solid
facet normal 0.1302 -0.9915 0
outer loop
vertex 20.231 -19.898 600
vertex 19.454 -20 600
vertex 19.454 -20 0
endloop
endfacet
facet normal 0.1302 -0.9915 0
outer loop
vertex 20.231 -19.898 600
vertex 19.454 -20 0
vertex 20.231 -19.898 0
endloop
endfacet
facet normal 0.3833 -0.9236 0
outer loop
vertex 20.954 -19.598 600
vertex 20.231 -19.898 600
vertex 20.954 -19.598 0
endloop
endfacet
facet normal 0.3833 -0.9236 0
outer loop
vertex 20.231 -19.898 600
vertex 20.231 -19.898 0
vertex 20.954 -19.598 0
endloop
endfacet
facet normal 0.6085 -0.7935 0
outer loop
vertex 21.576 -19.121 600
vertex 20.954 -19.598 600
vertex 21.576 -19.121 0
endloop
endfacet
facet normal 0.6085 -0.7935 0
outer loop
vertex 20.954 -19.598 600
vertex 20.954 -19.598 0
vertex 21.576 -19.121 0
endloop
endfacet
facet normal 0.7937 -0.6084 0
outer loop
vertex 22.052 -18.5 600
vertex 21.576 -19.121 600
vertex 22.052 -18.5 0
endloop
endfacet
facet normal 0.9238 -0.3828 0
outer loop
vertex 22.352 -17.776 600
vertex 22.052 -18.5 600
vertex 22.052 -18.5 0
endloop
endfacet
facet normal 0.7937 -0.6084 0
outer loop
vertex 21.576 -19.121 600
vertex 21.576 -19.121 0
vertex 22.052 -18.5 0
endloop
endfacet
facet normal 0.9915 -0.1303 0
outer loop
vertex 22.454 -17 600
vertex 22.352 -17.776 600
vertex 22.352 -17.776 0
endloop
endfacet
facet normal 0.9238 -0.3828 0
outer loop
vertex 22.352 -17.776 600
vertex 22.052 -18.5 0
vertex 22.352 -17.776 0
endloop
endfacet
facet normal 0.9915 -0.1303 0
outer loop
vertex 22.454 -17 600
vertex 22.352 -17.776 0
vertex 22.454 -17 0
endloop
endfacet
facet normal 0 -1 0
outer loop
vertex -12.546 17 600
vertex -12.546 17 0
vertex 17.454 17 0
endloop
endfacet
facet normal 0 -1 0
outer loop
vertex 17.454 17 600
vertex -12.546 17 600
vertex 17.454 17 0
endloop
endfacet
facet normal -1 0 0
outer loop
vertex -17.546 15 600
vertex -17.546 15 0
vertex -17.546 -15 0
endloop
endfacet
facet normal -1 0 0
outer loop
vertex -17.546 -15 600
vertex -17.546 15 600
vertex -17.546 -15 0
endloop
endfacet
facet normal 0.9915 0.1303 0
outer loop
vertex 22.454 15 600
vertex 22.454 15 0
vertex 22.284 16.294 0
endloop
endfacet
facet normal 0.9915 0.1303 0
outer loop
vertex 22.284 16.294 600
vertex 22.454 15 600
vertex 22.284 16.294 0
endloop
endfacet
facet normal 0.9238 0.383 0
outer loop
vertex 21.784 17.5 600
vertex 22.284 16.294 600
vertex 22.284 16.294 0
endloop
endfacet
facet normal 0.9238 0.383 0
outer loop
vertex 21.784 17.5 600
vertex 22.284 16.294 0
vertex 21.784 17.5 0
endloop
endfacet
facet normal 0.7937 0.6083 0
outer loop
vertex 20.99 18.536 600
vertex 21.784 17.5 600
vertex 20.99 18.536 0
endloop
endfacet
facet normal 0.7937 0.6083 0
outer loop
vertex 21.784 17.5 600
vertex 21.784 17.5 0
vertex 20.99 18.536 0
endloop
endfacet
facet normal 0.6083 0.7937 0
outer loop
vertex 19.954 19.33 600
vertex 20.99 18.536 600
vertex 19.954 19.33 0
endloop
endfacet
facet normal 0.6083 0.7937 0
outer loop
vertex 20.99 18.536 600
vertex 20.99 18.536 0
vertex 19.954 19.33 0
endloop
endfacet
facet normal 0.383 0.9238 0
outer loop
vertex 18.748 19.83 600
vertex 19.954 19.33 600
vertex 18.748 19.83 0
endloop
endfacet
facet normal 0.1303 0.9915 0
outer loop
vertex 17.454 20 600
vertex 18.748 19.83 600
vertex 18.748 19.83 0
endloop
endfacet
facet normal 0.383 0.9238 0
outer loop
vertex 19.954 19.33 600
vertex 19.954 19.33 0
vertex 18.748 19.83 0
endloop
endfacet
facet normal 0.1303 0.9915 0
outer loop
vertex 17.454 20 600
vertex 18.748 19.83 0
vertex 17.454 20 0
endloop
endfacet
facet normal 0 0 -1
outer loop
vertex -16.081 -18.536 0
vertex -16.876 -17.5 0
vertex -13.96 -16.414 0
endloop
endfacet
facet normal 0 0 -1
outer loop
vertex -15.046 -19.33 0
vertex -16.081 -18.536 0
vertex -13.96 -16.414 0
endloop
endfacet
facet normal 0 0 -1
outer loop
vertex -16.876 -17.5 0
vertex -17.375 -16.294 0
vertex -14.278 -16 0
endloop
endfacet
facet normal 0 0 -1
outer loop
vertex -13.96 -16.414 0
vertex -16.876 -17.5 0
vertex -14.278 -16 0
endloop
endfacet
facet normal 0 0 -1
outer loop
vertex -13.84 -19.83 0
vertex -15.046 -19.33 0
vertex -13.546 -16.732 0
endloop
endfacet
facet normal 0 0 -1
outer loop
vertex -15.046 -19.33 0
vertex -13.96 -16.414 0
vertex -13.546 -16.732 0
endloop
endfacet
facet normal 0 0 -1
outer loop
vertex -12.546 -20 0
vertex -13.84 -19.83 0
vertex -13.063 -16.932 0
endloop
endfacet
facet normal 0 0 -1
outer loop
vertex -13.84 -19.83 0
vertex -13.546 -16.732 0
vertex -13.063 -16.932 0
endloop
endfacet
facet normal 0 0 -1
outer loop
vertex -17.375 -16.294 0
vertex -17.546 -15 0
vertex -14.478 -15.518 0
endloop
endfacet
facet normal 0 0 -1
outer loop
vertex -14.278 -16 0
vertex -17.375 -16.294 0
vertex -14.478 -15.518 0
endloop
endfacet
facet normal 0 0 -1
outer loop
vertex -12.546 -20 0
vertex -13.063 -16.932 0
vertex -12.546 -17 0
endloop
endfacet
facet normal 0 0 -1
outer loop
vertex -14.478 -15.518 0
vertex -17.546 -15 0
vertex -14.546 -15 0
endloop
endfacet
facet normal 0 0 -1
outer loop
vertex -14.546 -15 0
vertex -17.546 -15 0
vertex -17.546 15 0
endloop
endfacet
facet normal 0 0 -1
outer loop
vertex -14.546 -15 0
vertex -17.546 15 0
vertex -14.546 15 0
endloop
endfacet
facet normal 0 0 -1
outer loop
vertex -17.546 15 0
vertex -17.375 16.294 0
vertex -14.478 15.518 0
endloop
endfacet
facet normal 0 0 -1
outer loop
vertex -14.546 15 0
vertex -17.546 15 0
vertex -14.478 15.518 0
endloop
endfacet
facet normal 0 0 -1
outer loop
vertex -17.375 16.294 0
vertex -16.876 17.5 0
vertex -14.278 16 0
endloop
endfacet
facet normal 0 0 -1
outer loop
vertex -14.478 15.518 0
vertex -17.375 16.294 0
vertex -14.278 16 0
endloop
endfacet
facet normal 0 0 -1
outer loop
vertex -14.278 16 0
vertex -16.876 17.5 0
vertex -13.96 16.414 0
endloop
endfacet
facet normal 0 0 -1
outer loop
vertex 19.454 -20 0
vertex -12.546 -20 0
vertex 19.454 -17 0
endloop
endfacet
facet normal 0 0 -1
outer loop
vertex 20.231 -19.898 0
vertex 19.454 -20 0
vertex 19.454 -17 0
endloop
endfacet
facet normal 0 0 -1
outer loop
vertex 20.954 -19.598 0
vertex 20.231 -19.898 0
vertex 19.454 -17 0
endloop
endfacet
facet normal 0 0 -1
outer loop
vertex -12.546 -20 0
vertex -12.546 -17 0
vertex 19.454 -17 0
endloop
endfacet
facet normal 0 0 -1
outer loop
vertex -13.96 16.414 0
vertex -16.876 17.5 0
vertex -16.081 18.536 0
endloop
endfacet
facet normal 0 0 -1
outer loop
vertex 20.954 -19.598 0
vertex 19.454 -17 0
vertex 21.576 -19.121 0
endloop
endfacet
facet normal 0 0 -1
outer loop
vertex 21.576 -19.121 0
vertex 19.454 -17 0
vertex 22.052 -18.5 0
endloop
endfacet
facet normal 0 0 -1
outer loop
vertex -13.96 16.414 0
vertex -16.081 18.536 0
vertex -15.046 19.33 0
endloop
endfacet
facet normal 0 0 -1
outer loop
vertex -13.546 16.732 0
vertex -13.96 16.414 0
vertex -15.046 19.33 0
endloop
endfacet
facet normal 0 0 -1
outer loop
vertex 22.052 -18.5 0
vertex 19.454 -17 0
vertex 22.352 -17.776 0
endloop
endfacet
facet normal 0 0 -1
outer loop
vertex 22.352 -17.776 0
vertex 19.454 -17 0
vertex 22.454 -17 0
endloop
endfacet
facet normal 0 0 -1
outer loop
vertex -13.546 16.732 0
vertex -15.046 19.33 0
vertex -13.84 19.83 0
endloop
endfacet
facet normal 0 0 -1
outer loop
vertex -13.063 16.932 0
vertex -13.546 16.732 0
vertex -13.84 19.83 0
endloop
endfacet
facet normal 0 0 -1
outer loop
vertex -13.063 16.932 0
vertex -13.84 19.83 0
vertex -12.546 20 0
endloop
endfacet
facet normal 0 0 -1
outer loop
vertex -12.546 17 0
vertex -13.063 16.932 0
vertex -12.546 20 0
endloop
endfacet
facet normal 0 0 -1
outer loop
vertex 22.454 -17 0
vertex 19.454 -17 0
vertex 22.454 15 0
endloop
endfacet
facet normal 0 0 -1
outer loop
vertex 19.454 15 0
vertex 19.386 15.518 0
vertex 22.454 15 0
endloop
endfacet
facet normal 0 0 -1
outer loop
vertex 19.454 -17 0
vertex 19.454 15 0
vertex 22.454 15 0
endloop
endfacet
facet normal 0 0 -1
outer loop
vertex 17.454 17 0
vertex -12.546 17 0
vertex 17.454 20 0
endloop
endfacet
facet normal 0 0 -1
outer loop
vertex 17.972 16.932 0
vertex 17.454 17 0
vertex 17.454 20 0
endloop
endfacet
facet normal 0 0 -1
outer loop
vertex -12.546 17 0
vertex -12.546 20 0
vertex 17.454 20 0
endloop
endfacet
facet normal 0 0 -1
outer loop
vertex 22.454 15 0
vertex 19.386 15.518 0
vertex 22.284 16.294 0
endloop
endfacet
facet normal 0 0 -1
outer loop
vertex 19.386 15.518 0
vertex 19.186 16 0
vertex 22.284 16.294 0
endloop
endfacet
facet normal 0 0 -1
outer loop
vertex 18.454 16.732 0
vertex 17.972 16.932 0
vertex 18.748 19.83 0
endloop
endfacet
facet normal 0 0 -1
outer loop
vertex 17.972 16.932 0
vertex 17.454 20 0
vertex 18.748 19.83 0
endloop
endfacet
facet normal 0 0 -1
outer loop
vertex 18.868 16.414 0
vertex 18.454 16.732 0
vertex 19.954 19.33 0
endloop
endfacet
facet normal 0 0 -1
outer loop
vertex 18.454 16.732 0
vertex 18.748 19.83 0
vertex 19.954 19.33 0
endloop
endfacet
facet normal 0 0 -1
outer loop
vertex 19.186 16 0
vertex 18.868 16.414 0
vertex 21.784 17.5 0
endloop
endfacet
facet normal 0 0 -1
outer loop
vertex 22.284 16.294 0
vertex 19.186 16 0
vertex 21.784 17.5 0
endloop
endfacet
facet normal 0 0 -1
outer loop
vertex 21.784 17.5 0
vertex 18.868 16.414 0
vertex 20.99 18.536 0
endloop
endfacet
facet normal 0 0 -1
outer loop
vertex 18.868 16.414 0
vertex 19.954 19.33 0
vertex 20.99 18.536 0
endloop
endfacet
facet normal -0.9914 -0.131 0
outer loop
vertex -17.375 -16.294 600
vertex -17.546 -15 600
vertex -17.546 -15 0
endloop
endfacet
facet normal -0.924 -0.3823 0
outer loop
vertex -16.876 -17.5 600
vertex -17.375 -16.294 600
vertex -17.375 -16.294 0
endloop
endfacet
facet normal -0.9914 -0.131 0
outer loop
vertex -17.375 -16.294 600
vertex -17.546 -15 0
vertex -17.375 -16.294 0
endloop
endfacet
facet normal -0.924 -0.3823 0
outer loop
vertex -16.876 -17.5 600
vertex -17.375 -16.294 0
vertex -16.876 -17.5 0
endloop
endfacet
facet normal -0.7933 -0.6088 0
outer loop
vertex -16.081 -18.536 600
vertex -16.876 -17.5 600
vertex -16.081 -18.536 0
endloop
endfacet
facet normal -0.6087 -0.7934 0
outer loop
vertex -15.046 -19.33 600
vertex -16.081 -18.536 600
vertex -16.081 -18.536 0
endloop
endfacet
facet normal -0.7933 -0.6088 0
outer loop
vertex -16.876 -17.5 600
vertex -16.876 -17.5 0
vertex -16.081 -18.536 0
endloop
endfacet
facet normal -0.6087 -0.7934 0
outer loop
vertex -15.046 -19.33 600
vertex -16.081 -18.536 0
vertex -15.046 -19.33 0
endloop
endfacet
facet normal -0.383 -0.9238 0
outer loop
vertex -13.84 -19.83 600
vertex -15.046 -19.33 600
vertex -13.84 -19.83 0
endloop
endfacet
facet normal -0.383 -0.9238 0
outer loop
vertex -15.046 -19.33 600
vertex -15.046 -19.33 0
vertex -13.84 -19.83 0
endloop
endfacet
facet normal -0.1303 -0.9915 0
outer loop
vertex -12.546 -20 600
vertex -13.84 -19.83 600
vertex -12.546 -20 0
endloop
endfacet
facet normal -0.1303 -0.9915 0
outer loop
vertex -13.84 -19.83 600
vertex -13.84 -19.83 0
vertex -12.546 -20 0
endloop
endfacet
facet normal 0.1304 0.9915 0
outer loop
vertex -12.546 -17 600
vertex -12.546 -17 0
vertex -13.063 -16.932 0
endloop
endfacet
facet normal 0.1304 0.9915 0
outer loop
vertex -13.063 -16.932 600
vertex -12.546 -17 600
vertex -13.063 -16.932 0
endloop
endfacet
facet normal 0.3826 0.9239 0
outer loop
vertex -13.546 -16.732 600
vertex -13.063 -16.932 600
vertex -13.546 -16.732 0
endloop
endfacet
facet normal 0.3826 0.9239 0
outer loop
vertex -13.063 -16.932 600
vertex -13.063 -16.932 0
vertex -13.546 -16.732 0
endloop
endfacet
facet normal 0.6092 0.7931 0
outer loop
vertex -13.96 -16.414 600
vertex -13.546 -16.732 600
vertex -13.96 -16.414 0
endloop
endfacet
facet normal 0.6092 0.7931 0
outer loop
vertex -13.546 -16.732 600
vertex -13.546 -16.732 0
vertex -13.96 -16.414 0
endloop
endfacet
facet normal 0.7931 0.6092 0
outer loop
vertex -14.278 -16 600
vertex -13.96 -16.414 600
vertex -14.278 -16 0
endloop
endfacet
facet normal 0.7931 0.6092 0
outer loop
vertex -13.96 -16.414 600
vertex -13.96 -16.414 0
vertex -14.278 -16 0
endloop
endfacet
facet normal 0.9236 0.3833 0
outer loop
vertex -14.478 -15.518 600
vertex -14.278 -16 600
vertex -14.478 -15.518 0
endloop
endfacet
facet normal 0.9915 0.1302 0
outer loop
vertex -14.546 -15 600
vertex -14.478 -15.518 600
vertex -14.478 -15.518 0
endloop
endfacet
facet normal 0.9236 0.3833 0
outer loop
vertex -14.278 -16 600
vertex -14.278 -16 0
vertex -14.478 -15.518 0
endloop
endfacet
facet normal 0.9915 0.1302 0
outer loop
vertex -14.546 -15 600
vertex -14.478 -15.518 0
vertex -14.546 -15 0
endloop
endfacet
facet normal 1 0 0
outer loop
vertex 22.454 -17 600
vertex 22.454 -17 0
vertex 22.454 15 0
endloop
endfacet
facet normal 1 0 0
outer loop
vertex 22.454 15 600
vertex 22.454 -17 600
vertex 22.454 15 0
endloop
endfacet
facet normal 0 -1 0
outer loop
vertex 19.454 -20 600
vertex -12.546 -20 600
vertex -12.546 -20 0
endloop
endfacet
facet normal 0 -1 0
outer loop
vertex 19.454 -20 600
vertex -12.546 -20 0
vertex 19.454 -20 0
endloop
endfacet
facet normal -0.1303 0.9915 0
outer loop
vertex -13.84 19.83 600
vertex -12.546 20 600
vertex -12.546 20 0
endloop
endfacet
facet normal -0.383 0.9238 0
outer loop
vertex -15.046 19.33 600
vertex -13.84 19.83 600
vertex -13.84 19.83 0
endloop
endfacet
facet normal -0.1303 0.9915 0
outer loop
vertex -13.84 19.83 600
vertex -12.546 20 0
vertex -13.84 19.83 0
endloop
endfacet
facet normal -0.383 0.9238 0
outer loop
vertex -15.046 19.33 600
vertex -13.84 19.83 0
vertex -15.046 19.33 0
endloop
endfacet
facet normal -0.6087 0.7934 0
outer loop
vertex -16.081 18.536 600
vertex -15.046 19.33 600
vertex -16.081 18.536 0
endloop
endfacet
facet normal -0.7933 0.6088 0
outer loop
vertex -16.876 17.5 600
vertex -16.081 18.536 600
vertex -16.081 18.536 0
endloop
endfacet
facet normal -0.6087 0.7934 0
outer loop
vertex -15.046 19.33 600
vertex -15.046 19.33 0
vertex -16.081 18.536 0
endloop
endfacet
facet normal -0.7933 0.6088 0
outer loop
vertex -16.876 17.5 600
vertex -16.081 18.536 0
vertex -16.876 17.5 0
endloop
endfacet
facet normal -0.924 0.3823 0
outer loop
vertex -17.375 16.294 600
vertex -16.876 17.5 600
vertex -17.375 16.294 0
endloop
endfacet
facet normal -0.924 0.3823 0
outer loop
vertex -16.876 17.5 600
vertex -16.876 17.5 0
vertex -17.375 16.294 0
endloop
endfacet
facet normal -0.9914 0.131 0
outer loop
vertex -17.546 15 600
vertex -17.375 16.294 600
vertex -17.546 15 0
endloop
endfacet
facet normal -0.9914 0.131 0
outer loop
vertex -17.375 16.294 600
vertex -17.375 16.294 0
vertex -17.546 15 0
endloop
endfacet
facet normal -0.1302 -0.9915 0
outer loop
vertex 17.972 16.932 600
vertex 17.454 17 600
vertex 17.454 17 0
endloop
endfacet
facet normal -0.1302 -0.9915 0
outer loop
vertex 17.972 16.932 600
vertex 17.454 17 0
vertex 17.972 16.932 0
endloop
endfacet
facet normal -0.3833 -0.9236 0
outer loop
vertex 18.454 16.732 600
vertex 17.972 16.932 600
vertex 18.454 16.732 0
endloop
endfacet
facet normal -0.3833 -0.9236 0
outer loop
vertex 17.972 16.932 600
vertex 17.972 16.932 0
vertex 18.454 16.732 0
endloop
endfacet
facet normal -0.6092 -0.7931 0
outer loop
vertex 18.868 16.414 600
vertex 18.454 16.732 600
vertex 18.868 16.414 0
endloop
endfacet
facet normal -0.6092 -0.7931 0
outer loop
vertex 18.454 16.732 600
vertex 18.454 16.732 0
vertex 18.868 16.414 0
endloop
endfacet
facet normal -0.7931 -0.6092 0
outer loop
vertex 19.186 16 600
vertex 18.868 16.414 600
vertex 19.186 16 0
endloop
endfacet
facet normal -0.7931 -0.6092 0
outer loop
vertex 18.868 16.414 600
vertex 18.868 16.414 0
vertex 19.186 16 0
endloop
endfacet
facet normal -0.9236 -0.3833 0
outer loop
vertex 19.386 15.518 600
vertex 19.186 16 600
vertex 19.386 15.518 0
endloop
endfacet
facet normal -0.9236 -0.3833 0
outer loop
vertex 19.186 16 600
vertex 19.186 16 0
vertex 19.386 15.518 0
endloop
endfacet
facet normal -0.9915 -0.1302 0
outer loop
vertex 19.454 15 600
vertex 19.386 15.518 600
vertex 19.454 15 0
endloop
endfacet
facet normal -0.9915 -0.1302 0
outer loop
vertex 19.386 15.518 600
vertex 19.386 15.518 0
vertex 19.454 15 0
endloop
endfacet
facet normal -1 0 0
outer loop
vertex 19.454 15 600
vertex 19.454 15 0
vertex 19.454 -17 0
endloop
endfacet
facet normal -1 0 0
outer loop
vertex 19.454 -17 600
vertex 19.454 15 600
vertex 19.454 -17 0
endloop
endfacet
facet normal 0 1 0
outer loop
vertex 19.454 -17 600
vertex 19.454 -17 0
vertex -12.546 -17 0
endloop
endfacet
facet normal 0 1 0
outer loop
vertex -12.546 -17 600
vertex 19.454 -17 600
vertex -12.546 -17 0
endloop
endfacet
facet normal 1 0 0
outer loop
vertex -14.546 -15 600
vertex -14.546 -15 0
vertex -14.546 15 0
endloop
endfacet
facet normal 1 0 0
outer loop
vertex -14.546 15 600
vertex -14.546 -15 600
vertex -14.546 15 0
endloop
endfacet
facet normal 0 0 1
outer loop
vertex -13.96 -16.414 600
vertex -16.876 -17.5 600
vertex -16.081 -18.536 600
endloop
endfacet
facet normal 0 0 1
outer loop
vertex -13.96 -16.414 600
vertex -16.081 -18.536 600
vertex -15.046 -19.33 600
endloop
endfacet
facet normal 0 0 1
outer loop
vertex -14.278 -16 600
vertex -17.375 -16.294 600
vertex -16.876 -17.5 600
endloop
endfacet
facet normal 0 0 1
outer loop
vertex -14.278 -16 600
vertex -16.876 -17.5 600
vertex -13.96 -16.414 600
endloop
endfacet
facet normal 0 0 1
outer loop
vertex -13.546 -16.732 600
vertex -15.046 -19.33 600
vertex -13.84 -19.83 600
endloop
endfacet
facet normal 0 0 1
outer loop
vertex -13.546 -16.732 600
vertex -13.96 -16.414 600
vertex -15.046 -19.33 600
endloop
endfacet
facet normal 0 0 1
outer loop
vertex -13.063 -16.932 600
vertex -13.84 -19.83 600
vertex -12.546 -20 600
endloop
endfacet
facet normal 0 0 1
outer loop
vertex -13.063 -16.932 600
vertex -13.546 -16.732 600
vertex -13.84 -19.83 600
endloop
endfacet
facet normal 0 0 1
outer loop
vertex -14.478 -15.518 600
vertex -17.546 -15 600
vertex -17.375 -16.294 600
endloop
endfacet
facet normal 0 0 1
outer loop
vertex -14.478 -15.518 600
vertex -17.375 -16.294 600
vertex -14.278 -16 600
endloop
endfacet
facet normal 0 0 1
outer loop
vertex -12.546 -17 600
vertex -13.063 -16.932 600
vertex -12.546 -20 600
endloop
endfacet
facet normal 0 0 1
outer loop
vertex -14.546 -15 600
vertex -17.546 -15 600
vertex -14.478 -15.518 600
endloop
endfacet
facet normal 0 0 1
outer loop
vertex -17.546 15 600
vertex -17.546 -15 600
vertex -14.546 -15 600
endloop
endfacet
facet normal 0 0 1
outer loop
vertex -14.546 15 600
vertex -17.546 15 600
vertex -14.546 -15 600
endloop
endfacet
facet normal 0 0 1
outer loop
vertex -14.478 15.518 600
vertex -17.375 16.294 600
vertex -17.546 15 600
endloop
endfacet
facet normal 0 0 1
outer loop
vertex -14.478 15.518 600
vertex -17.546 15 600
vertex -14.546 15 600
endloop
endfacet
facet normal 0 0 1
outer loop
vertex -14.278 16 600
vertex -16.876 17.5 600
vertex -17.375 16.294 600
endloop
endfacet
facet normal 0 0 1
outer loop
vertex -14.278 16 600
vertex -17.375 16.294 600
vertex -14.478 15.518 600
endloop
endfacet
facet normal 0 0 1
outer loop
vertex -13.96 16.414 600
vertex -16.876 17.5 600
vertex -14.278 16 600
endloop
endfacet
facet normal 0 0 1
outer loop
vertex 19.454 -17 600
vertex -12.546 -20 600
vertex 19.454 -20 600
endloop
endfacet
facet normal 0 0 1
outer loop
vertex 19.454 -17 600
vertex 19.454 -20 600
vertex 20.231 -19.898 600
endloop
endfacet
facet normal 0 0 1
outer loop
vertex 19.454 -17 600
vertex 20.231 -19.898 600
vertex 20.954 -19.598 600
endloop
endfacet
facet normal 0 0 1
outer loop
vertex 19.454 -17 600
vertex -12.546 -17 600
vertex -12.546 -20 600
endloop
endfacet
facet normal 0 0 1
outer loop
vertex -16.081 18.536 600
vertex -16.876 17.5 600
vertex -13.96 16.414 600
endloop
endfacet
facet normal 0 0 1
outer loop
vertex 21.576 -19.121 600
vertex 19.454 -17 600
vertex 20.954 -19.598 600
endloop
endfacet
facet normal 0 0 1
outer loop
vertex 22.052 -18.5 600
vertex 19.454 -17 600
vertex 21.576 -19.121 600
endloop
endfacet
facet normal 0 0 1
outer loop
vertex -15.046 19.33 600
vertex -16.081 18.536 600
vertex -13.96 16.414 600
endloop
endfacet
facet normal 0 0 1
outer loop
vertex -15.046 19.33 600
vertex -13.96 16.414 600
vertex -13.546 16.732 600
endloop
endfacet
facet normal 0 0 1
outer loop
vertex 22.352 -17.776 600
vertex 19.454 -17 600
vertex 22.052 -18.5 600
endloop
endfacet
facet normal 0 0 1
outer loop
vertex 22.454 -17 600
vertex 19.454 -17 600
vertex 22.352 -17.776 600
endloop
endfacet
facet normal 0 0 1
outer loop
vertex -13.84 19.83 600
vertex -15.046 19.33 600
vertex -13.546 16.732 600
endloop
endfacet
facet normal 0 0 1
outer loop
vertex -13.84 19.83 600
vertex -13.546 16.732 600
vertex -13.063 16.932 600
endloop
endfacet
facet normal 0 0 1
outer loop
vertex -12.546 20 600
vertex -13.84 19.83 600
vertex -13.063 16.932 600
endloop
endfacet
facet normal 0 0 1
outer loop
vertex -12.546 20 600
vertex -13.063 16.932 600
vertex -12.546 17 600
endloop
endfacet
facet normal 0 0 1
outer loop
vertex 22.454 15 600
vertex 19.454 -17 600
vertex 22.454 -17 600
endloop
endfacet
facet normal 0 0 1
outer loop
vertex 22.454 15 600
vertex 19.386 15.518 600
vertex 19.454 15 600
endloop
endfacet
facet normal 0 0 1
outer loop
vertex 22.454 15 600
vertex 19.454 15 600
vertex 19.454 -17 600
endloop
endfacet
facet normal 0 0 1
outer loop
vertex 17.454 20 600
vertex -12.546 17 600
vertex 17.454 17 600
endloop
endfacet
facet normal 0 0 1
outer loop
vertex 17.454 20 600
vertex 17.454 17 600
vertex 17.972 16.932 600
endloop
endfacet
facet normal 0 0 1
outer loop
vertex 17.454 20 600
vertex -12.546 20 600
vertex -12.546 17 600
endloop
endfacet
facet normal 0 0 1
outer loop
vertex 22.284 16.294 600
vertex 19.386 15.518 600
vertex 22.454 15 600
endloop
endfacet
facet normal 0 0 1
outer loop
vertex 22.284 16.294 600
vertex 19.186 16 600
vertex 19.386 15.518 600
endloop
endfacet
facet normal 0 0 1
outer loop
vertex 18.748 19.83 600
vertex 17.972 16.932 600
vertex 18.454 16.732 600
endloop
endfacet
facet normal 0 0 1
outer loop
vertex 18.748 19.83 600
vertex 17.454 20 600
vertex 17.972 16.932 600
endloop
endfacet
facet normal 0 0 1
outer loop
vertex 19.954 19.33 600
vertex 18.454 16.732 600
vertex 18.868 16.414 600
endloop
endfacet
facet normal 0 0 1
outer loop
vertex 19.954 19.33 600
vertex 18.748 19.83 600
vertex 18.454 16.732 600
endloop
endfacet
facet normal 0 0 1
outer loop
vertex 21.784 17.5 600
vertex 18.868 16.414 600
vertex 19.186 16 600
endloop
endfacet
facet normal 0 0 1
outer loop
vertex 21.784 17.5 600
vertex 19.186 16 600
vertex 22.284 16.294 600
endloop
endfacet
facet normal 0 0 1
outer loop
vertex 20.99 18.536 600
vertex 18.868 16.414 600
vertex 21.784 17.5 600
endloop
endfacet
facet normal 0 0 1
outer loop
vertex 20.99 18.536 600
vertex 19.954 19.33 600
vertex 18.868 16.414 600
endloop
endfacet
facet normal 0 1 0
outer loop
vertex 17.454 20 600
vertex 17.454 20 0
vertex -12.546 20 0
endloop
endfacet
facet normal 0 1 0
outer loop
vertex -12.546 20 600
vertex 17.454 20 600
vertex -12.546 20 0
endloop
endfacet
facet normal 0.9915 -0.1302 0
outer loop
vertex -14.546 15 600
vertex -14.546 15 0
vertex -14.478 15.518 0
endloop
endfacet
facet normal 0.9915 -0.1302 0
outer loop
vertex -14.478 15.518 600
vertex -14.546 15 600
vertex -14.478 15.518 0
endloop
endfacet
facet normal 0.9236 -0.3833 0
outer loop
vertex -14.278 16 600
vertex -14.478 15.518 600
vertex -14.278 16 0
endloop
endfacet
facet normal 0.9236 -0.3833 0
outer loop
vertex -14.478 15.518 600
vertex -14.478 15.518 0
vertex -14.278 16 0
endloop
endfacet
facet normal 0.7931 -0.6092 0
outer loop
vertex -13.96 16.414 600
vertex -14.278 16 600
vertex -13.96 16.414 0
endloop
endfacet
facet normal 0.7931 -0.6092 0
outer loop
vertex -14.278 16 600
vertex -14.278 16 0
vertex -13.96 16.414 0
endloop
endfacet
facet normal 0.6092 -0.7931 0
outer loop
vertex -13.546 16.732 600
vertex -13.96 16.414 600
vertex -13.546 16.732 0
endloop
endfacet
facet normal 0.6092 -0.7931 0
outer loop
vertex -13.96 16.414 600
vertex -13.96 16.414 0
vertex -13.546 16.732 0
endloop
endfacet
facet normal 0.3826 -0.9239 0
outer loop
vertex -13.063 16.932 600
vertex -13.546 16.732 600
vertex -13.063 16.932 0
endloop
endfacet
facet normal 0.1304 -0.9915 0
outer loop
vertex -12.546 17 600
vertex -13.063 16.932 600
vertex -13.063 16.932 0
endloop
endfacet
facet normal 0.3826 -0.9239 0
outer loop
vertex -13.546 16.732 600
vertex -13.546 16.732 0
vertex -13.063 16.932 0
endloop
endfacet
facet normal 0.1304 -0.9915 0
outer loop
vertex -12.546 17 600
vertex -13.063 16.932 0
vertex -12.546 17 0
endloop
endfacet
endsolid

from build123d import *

# Parameters (mm, degrees)
F1_DEPTH = 600


with BuildPart() as f1:
    # F0 (on Top) → F1 (new body)
    with BuildSketch(Plane.XY):
        with BuildLine():
            ThreePointArc((22.454205, 15), (20.989739, 18.535534), (17.454205, 20))
            Line((17.454205, 20), (-12.545795, 20))
            ThreePointArc((-12.545795, 20), (-16.081329, 18.535534), (-17.545795, 15))
            Line((-17.545795, 15), (-17.545795, -15))
            ThreePointArc((-17.545795, -15), (-16.081329, -18.535534), (-12.545795, -20))
            Line((-12.545795, -20), (19.454205, -20))
            ThreePointArc((19.454205, -20), (21.575525, -19.12132), (22.454205, -17))
            Line((22.454205, -17), (22.454205, 15))
        make_face()
        with BuildLine():
            Line((-12.545795, 17), (17.454205, 17))
            ThreePointArc((17.454205, 17), (18.868419, 16.414214), (19.454205, 15))
            Line((19.454205, 15), (19.454205, -17))
            Line((19.454205, -17), (-12.545795, -17))
            ThreePointArc((-12.545795, -17), (-13.960009, -16.414214), (-14.545795, -15))
            Line((-14.545795, -15), (-14.545795, 15))
            ThreePointArc((-14.545795, 15), (-13.960009, 16.414214), (-12.545795, 17))
        make_face(mode=Mode.SUBTRACT)
    extrude(amount=F1_DEPTH)


solid = f1.part
